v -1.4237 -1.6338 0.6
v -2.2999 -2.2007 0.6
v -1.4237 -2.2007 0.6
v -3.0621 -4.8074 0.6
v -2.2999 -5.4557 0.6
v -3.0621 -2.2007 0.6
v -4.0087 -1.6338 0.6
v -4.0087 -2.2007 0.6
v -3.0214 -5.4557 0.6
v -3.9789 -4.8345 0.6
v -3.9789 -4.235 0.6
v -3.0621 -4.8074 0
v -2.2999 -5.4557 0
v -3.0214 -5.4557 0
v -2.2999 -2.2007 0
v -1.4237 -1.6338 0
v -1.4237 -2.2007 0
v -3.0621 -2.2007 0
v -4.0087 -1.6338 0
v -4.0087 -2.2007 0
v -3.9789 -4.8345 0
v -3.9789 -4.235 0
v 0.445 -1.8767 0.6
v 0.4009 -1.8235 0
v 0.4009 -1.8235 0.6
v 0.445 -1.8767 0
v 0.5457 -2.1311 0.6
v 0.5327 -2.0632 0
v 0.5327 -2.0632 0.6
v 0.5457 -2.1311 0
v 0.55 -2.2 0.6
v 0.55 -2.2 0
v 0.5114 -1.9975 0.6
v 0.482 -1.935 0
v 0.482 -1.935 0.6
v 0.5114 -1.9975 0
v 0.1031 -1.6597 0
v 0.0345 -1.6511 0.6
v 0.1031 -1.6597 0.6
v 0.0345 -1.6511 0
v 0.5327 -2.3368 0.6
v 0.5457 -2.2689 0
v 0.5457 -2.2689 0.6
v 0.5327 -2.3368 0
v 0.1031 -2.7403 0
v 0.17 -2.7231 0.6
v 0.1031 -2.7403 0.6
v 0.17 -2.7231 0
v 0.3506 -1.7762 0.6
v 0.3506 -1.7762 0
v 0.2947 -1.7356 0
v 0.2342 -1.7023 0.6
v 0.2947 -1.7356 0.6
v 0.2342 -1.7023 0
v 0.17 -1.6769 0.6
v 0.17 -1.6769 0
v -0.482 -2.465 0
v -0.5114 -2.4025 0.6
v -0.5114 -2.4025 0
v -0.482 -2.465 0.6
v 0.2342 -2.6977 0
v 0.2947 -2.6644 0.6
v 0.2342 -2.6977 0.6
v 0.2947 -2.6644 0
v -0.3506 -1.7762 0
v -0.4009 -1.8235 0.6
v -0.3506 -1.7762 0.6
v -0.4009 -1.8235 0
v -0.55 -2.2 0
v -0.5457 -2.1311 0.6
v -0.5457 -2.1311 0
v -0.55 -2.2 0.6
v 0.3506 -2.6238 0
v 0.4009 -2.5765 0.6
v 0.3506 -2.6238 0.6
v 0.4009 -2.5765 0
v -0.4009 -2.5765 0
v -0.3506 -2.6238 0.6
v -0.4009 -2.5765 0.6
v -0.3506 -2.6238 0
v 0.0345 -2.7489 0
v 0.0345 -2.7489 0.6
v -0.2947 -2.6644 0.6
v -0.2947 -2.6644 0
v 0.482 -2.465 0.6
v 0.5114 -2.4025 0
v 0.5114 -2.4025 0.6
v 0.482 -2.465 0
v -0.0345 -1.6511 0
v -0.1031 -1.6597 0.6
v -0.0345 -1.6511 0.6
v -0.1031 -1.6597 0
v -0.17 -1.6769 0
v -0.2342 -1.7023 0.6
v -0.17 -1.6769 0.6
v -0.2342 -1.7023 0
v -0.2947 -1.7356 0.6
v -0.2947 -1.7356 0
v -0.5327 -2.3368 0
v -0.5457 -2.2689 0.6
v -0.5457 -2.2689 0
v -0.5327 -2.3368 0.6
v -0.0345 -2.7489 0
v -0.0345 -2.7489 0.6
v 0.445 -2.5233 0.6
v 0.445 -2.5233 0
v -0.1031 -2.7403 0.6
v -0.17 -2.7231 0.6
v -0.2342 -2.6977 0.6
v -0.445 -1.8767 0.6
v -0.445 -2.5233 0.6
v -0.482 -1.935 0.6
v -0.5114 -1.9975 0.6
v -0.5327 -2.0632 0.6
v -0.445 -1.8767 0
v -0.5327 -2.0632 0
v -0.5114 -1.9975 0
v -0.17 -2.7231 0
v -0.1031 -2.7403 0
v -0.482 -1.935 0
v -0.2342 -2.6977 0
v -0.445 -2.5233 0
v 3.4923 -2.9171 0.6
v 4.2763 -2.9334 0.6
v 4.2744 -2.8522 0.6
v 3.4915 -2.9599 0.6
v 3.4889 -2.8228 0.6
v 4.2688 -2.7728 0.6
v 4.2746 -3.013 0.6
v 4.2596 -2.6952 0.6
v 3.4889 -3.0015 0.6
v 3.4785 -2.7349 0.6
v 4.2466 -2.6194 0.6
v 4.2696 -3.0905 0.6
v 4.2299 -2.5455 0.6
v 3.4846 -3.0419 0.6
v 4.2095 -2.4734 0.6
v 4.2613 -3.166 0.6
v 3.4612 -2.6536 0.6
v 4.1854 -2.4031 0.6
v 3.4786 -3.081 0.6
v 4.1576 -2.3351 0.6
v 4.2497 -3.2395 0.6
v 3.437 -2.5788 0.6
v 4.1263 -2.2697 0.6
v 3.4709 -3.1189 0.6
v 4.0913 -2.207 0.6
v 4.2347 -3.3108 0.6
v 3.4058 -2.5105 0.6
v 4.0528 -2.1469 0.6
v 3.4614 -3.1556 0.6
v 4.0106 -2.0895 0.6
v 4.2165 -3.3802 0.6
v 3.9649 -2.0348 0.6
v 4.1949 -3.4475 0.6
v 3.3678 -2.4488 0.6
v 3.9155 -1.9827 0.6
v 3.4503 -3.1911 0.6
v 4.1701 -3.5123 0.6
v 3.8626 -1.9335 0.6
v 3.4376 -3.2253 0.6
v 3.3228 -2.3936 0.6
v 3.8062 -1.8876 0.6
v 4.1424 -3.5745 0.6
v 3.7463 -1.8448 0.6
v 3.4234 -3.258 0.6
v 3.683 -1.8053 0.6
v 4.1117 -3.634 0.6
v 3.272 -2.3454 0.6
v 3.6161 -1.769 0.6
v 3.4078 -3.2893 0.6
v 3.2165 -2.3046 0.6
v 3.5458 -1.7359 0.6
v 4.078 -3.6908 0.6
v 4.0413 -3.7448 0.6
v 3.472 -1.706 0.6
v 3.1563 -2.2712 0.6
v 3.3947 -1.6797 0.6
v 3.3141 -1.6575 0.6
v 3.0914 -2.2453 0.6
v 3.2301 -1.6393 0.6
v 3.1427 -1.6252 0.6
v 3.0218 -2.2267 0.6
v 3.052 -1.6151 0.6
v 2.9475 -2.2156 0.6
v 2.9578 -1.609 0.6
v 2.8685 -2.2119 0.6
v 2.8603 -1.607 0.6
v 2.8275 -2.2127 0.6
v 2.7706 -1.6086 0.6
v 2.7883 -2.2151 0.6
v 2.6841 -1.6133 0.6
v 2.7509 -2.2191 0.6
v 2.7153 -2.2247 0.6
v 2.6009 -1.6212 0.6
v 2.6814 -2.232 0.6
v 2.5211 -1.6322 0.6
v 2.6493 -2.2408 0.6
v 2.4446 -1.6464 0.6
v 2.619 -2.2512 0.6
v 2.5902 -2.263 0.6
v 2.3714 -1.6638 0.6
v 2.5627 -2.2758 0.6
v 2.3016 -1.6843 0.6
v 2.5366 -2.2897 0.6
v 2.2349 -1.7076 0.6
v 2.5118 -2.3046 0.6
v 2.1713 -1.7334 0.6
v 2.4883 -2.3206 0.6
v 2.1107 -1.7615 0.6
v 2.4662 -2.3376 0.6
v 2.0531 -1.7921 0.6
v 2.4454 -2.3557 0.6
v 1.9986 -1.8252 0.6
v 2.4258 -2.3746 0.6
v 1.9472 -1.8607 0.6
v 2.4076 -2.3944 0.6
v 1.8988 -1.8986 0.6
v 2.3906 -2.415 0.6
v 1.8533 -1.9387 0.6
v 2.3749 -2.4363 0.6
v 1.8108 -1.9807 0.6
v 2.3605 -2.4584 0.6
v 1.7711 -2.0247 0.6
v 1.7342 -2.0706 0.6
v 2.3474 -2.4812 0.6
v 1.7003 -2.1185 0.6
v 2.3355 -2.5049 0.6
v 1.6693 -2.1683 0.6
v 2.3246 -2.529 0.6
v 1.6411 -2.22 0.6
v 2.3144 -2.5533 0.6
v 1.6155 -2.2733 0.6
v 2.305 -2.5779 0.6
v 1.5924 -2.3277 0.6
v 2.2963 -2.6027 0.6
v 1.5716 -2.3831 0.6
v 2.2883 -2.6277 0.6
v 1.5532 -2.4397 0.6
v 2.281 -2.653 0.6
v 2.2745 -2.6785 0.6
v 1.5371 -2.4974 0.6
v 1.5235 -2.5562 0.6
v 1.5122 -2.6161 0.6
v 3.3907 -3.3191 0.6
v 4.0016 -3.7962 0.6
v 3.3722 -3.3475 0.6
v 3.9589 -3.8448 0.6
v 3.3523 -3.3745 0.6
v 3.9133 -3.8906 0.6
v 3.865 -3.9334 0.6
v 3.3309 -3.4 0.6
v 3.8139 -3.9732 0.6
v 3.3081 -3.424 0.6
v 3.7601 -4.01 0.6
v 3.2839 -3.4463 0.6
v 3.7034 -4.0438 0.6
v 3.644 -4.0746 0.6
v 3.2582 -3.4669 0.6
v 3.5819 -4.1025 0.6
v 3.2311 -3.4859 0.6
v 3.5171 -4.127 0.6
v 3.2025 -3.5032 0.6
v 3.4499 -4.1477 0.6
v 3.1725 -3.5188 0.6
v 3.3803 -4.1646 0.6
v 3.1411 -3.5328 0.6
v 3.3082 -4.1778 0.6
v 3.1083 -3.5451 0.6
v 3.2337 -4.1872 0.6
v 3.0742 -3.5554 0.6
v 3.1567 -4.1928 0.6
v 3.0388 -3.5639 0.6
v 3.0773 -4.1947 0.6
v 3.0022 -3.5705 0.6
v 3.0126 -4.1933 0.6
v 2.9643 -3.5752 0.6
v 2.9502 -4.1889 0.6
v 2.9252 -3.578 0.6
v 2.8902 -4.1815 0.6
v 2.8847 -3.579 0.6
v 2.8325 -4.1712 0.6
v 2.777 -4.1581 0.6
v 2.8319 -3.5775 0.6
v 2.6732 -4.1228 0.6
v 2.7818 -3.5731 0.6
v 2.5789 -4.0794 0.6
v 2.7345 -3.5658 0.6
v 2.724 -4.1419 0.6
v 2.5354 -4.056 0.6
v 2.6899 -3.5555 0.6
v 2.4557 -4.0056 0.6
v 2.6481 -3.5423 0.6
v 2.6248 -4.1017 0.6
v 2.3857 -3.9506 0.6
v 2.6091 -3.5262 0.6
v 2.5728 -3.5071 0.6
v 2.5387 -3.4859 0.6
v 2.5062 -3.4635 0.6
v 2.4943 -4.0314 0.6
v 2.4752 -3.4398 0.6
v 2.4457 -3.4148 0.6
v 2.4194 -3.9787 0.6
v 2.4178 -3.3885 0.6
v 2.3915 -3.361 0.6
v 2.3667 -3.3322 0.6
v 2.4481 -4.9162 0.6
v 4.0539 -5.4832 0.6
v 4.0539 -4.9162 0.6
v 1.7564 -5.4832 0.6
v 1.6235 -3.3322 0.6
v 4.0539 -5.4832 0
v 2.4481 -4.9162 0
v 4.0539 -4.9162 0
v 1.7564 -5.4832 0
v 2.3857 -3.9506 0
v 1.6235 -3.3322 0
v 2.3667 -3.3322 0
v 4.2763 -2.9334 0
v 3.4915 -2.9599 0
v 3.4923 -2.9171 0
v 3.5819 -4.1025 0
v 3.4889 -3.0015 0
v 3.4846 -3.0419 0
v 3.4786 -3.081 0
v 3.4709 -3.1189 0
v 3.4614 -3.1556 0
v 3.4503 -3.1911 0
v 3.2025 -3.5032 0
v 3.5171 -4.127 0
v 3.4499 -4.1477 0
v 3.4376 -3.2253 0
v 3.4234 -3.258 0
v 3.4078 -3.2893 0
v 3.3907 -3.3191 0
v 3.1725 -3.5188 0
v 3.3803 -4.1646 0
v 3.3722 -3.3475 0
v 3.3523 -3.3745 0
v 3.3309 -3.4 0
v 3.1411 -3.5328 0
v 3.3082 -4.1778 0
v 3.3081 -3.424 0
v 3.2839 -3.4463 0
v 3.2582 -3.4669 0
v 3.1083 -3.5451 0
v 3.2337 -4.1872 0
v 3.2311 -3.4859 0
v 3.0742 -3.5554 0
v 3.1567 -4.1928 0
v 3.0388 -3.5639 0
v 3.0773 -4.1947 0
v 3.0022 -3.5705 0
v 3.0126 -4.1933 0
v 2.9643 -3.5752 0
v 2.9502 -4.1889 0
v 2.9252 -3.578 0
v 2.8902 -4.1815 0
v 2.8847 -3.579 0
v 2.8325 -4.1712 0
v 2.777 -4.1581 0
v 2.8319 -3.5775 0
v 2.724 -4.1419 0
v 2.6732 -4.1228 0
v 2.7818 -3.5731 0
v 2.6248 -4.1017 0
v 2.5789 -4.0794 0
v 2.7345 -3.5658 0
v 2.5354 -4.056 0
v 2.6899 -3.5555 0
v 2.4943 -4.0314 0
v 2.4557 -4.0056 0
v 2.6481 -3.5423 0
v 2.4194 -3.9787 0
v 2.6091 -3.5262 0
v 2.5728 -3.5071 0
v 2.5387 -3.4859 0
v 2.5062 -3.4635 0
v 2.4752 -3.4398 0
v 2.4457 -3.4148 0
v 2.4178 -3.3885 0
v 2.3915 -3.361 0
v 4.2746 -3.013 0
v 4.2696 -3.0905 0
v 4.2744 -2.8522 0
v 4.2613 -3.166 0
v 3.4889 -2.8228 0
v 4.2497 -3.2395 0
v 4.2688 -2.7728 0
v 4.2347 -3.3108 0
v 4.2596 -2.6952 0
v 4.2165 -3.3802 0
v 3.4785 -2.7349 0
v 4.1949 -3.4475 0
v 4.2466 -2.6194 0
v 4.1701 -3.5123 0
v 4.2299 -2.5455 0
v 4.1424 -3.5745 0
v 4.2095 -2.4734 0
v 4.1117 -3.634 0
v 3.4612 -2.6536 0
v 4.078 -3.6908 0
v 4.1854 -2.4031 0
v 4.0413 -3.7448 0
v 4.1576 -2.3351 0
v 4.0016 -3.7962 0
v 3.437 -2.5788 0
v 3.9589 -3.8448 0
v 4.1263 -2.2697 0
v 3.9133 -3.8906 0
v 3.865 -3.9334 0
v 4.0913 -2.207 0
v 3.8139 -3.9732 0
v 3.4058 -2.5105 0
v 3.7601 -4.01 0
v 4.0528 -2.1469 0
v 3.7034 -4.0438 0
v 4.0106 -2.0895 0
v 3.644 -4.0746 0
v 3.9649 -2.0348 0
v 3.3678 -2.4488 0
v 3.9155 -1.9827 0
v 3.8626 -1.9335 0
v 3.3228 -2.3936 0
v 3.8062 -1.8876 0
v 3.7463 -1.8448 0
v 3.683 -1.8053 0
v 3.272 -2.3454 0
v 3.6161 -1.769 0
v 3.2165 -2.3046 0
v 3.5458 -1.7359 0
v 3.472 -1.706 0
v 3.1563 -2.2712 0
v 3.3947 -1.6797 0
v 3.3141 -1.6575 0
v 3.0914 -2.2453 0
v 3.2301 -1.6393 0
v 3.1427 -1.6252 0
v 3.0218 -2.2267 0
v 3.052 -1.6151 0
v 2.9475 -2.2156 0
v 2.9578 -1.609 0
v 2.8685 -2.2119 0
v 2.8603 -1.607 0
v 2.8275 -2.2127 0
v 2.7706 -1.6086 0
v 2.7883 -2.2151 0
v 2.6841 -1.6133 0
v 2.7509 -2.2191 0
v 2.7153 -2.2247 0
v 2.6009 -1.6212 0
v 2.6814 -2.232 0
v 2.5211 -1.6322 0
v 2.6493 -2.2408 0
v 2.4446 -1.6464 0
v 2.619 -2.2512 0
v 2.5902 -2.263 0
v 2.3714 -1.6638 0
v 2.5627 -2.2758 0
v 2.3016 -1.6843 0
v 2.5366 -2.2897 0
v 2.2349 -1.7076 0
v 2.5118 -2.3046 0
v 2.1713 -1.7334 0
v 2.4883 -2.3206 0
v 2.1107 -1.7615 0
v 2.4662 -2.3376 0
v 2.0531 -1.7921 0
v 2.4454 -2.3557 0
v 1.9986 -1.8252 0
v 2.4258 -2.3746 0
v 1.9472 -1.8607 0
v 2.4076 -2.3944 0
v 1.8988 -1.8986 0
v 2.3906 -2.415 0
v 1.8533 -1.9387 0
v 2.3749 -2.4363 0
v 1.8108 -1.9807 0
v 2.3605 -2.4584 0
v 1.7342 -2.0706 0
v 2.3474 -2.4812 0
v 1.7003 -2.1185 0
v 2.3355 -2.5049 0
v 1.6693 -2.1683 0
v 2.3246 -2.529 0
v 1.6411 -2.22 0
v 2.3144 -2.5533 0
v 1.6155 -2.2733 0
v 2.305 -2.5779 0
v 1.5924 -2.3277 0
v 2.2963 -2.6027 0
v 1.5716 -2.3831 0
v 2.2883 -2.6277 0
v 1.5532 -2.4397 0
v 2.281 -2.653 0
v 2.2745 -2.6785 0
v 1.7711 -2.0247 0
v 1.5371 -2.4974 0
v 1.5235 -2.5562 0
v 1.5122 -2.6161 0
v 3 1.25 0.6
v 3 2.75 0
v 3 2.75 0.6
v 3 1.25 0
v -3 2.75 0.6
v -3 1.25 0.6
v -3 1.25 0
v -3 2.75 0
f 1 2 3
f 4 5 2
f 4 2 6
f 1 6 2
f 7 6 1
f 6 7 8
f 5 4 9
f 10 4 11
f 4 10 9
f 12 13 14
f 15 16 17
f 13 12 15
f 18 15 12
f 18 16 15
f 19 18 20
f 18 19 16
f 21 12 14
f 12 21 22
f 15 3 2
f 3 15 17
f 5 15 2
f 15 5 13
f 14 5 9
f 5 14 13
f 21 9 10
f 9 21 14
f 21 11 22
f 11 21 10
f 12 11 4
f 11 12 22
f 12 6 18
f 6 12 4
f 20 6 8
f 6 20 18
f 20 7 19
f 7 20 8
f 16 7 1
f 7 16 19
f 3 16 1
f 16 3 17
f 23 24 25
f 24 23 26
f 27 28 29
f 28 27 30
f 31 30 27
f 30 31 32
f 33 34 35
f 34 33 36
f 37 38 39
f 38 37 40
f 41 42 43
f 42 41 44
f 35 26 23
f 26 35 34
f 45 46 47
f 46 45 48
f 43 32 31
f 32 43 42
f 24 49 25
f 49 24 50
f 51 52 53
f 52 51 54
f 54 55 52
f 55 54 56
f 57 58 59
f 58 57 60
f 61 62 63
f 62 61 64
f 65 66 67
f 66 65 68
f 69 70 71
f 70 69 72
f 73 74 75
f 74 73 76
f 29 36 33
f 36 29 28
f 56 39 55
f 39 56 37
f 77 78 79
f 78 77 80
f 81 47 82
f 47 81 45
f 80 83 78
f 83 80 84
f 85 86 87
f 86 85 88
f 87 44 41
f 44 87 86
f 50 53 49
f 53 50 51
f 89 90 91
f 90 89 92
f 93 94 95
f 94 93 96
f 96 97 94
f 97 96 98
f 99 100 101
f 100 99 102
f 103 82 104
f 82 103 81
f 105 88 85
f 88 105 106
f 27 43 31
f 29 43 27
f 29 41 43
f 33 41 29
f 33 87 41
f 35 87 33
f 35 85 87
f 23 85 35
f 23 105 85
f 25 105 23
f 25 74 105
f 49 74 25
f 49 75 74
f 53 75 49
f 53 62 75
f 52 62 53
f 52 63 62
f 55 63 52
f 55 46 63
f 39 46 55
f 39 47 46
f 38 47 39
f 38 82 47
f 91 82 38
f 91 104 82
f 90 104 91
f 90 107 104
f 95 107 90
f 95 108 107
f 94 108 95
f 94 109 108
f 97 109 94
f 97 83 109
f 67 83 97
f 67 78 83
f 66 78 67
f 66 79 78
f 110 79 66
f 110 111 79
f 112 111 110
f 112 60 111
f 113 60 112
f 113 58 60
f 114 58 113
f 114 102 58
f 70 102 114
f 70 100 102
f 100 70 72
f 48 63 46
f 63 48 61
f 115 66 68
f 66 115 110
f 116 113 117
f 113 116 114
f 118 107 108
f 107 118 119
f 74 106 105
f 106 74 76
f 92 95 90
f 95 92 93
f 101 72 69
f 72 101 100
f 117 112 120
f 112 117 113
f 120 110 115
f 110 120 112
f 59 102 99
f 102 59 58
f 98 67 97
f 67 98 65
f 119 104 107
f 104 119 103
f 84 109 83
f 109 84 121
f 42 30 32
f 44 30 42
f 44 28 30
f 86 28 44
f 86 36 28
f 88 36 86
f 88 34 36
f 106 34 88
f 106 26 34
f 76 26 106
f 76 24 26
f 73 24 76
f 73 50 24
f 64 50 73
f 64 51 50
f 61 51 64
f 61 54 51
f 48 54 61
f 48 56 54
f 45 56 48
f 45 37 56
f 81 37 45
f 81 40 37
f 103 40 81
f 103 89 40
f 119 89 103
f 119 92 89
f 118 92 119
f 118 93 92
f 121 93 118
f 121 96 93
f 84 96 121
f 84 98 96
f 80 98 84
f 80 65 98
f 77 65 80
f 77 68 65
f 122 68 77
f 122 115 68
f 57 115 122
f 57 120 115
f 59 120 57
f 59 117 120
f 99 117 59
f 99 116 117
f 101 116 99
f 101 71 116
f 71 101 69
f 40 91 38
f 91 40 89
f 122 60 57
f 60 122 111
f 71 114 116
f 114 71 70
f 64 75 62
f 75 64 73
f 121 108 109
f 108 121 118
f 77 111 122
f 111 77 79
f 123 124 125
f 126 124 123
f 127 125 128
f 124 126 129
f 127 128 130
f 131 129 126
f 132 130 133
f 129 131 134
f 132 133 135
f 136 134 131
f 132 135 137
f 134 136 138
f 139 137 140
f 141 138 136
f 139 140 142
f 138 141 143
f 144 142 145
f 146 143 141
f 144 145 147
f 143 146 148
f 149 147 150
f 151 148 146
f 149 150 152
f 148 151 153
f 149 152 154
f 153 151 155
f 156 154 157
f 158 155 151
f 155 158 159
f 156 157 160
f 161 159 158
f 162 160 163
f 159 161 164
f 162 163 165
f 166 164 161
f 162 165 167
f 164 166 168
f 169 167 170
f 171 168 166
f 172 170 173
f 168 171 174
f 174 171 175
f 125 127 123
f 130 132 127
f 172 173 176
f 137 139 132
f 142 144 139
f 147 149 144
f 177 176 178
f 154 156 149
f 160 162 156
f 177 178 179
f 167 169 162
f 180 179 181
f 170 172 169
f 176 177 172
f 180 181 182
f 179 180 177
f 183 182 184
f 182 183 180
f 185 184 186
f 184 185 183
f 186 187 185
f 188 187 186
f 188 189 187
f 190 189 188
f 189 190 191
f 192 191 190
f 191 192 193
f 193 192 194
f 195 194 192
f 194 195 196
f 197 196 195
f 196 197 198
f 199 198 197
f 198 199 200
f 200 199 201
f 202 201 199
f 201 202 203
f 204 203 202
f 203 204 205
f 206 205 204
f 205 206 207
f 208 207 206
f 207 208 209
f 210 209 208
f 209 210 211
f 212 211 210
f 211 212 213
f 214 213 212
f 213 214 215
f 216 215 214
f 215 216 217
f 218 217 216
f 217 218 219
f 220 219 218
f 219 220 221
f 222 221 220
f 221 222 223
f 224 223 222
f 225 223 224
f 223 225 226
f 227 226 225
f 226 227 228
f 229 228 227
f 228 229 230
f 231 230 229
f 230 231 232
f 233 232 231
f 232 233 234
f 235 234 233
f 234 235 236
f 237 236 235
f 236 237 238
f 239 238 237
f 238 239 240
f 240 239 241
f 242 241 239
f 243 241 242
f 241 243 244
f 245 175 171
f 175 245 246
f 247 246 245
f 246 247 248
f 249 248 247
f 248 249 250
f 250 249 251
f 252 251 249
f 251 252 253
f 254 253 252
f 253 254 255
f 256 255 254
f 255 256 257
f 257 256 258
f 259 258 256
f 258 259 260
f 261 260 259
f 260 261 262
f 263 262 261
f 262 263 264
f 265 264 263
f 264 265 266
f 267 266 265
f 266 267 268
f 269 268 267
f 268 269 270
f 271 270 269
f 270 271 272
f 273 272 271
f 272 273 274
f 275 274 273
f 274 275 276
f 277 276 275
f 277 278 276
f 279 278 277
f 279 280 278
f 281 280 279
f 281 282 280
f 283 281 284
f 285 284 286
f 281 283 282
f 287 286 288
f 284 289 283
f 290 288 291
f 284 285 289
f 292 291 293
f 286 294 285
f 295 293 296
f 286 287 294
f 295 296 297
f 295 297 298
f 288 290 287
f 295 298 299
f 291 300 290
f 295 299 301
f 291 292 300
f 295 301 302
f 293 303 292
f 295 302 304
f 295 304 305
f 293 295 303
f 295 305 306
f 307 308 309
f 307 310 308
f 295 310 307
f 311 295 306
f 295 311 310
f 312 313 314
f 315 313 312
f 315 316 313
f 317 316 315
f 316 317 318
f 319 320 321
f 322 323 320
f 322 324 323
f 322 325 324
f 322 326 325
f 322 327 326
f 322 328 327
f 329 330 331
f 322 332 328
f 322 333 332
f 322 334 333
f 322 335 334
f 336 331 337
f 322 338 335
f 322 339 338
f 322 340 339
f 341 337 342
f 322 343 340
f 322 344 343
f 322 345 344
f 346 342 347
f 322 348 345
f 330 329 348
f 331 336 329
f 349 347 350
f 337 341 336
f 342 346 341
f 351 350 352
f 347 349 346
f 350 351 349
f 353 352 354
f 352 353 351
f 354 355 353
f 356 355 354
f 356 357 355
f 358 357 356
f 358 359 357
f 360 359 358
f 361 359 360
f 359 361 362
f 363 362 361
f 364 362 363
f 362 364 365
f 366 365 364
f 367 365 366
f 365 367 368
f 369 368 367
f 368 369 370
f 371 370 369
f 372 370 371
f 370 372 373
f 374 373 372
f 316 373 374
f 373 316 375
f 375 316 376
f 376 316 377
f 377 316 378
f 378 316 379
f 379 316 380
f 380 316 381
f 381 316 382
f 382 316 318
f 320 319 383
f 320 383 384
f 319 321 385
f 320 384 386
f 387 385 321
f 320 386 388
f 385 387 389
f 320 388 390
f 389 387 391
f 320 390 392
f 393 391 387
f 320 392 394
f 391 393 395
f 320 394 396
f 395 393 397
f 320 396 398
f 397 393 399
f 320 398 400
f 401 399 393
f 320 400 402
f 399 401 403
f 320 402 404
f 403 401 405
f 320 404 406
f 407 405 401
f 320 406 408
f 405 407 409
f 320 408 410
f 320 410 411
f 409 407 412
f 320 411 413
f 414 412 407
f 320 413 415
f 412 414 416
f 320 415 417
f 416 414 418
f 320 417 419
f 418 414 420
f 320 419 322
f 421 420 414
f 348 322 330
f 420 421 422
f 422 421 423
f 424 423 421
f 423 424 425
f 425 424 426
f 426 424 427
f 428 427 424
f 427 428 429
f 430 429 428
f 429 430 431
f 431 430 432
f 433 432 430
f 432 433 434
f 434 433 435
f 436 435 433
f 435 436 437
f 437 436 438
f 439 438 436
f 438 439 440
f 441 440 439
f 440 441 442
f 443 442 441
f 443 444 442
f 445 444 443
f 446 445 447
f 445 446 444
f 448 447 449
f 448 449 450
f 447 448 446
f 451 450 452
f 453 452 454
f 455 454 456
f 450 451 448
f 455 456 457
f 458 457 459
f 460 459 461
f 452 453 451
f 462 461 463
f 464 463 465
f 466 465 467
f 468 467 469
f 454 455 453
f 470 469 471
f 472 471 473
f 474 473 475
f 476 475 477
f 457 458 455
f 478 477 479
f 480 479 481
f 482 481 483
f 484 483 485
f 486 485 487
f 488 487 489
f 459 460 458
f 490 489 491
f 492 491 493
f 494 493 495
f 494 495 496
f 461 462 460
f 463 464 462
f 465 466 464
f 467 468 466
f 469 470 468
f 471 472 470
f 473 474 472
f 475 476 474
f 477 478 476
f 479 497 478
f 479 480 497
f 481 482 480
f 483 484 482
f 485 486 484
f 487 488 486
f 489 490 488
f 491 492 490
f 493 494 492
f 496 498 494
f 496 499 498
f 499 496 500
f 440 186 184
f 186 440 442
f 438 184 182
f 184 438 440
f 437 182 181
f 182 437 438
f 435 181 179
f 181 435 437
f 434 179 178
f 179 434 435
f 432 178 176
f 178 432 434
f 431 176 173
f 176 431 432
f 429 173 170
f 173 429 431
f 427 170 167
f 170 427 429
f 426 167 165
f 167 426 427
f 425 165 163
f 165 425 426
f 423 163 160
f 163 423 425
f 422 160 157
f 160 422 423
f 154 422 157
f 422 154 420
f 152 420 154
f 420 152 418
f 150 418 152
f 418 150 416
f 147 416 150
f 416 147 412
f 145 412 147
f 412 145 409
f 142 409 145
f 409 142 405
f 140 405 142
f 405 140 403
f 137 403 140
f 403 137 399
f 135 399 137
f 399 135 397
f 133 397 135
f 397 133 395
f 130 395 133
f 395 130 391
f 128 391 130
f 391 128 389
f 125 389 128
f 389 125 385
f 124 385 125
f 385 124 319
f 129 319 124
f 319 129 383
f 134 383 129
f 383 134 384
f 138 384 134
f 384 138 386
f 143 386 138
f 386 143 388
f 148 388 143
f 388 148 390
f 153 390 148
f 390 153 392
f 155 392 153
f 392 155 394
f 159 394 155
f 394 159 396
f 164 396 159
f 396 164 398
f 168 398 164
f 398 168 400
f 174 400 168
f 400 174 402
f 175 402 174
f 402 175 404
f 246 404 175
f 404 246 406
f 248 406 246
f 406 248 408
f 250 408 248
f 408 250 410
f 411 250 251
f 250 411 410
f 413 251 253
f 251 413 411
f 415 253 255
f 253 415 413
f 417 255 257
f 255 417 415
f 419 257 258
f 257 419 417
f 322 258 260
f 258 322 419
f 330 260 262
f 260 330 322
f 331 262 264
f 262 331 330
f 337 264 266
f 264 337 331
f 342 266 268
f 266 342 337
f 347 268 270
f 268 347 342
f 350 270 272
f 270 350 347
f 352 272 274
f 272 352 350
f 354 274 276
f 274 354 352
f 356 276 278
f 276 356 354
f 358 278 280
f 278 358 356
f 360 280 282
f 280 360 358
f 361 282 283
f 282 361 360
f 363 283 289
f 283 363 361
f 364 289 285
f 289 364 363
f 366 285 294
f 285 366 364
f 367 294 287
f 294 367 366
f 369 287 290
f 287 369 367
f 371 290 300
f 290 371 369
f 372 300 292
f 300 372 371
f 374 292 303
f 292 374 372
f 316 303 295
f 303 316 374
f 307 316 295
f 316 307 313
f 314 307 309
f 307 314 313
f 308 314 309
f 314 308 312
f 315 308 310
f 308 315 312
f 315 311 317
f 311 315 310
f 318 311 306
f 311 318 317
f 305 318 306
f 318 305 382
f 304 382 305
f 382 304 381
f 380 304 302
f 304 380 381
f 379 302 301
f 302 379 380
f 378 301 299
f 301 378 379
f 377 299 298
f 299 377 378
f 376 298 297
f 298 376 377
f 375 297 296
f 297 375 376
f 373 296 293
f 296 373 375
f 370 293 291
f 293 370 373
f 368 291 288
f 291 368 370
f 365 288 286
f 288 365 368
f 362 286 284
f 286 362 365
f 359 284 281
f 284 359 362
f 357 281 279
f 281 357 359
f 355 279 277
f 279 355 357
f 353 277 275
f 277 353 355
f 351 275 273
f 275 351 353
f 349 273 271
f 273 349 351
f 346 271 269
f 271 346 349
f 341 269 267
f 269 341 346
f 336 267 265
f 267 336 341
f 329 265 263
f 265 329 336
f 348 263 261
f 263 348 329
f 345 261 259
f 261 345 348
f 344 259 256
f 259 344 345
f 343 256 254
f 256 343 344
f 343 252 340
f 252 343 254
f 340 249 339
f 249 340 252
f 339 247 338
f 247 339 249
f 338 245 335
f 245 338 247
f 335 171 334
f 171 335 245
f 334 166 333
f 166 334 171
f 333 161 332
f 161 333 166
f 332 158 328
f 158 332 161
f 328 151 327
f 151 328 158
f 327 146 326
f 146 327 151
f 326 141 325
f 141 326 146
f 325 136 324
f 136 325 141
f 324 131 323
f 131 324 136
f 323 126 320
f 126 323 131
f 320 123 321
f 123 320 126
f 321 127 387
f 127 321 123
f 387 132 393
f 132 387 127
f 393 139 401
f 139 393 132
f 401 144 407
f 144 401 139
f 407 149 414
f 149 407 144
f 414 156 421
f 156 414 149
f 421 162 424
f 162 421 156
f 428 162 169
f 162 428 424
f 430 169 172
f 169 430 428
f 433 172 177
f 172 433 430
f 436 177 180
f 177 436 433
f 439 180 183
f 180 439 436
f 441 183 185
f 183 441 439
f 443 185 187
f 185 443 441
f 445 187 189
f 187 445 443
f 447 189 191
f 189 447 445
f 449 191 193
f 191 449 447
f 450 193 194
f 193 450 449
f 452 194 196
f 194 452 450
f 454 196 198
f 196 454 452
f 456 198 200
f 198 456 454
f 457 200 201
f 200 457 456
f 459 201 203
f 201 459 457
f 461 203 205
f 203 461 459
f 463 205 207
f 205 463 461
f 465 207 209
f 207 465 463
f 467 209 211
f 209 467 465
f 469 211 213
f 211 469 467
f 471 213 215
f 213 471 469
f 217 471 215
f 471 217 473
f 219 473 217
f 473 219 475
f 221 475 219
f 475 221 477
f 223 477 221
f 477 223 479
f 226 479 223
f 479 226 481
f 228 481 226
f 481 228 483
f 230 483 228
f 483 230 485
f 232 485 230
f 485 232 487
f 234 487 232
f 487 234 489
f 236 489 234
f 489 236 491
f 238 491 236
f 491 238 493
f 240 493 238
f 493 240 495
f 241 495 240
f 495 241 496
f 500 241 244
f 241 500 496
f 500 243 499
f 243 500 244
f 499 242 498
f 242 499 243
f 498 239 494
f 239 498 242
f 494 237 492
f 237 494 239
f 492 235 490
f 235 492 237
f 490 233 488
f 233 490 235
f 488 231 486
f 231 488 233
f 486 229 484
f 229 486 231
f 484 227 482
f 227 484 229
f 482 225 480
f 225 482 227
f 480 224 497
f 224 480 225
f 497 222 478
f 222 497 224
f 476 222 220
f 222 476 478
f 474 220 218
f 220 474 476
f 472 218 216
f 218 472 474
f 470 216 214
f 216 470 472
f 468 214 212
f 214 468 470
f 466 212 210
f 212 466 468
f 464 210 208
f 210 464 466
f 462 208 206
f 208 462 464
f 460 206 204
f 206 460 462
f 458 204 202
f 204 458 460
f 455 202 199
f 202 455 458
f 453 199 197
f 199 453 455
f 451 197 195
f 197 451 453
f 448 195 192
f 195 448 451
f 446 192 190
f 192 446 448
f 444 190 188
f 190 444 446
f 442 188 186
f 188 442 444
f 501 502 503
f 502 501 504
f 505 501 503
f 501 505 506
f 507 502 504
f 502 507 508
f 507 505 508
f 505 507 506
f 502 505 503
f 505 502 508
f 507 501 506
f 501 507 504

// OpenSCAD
$fn = 50;

difference() {
	union() {
		translate(v = [-2.85, -3.5, 0.6]) {
			rotate(a = [180, 0, 0]) {
				linear_extrude(height = 0.6) {
					text(font = "Liberation Sans:style=Bold", halign = "center", size = 4.0, text = "1", valign = "center");
				}
			}
		}
		translate(v = [0.0, -2.2, 0.0]) {
			cylinder(h = 0.6, r = 0.55);
		}
		translate(v = [2.85, -3.5, 0.6]) {
			rotate(a = [180, 0, 0]) {
				linear_extrude(height = 0.6) {
					text(font = "Liberation Sans:style=Bold", halign = "center", size = 4.0, text = "5", valign = "center");
				}
			}
		}
		translate(v = [-3.0, 1.25, 0]) {
			cube(size = [6, 1.5, 0.6]);
		}
	}
	union();
}
